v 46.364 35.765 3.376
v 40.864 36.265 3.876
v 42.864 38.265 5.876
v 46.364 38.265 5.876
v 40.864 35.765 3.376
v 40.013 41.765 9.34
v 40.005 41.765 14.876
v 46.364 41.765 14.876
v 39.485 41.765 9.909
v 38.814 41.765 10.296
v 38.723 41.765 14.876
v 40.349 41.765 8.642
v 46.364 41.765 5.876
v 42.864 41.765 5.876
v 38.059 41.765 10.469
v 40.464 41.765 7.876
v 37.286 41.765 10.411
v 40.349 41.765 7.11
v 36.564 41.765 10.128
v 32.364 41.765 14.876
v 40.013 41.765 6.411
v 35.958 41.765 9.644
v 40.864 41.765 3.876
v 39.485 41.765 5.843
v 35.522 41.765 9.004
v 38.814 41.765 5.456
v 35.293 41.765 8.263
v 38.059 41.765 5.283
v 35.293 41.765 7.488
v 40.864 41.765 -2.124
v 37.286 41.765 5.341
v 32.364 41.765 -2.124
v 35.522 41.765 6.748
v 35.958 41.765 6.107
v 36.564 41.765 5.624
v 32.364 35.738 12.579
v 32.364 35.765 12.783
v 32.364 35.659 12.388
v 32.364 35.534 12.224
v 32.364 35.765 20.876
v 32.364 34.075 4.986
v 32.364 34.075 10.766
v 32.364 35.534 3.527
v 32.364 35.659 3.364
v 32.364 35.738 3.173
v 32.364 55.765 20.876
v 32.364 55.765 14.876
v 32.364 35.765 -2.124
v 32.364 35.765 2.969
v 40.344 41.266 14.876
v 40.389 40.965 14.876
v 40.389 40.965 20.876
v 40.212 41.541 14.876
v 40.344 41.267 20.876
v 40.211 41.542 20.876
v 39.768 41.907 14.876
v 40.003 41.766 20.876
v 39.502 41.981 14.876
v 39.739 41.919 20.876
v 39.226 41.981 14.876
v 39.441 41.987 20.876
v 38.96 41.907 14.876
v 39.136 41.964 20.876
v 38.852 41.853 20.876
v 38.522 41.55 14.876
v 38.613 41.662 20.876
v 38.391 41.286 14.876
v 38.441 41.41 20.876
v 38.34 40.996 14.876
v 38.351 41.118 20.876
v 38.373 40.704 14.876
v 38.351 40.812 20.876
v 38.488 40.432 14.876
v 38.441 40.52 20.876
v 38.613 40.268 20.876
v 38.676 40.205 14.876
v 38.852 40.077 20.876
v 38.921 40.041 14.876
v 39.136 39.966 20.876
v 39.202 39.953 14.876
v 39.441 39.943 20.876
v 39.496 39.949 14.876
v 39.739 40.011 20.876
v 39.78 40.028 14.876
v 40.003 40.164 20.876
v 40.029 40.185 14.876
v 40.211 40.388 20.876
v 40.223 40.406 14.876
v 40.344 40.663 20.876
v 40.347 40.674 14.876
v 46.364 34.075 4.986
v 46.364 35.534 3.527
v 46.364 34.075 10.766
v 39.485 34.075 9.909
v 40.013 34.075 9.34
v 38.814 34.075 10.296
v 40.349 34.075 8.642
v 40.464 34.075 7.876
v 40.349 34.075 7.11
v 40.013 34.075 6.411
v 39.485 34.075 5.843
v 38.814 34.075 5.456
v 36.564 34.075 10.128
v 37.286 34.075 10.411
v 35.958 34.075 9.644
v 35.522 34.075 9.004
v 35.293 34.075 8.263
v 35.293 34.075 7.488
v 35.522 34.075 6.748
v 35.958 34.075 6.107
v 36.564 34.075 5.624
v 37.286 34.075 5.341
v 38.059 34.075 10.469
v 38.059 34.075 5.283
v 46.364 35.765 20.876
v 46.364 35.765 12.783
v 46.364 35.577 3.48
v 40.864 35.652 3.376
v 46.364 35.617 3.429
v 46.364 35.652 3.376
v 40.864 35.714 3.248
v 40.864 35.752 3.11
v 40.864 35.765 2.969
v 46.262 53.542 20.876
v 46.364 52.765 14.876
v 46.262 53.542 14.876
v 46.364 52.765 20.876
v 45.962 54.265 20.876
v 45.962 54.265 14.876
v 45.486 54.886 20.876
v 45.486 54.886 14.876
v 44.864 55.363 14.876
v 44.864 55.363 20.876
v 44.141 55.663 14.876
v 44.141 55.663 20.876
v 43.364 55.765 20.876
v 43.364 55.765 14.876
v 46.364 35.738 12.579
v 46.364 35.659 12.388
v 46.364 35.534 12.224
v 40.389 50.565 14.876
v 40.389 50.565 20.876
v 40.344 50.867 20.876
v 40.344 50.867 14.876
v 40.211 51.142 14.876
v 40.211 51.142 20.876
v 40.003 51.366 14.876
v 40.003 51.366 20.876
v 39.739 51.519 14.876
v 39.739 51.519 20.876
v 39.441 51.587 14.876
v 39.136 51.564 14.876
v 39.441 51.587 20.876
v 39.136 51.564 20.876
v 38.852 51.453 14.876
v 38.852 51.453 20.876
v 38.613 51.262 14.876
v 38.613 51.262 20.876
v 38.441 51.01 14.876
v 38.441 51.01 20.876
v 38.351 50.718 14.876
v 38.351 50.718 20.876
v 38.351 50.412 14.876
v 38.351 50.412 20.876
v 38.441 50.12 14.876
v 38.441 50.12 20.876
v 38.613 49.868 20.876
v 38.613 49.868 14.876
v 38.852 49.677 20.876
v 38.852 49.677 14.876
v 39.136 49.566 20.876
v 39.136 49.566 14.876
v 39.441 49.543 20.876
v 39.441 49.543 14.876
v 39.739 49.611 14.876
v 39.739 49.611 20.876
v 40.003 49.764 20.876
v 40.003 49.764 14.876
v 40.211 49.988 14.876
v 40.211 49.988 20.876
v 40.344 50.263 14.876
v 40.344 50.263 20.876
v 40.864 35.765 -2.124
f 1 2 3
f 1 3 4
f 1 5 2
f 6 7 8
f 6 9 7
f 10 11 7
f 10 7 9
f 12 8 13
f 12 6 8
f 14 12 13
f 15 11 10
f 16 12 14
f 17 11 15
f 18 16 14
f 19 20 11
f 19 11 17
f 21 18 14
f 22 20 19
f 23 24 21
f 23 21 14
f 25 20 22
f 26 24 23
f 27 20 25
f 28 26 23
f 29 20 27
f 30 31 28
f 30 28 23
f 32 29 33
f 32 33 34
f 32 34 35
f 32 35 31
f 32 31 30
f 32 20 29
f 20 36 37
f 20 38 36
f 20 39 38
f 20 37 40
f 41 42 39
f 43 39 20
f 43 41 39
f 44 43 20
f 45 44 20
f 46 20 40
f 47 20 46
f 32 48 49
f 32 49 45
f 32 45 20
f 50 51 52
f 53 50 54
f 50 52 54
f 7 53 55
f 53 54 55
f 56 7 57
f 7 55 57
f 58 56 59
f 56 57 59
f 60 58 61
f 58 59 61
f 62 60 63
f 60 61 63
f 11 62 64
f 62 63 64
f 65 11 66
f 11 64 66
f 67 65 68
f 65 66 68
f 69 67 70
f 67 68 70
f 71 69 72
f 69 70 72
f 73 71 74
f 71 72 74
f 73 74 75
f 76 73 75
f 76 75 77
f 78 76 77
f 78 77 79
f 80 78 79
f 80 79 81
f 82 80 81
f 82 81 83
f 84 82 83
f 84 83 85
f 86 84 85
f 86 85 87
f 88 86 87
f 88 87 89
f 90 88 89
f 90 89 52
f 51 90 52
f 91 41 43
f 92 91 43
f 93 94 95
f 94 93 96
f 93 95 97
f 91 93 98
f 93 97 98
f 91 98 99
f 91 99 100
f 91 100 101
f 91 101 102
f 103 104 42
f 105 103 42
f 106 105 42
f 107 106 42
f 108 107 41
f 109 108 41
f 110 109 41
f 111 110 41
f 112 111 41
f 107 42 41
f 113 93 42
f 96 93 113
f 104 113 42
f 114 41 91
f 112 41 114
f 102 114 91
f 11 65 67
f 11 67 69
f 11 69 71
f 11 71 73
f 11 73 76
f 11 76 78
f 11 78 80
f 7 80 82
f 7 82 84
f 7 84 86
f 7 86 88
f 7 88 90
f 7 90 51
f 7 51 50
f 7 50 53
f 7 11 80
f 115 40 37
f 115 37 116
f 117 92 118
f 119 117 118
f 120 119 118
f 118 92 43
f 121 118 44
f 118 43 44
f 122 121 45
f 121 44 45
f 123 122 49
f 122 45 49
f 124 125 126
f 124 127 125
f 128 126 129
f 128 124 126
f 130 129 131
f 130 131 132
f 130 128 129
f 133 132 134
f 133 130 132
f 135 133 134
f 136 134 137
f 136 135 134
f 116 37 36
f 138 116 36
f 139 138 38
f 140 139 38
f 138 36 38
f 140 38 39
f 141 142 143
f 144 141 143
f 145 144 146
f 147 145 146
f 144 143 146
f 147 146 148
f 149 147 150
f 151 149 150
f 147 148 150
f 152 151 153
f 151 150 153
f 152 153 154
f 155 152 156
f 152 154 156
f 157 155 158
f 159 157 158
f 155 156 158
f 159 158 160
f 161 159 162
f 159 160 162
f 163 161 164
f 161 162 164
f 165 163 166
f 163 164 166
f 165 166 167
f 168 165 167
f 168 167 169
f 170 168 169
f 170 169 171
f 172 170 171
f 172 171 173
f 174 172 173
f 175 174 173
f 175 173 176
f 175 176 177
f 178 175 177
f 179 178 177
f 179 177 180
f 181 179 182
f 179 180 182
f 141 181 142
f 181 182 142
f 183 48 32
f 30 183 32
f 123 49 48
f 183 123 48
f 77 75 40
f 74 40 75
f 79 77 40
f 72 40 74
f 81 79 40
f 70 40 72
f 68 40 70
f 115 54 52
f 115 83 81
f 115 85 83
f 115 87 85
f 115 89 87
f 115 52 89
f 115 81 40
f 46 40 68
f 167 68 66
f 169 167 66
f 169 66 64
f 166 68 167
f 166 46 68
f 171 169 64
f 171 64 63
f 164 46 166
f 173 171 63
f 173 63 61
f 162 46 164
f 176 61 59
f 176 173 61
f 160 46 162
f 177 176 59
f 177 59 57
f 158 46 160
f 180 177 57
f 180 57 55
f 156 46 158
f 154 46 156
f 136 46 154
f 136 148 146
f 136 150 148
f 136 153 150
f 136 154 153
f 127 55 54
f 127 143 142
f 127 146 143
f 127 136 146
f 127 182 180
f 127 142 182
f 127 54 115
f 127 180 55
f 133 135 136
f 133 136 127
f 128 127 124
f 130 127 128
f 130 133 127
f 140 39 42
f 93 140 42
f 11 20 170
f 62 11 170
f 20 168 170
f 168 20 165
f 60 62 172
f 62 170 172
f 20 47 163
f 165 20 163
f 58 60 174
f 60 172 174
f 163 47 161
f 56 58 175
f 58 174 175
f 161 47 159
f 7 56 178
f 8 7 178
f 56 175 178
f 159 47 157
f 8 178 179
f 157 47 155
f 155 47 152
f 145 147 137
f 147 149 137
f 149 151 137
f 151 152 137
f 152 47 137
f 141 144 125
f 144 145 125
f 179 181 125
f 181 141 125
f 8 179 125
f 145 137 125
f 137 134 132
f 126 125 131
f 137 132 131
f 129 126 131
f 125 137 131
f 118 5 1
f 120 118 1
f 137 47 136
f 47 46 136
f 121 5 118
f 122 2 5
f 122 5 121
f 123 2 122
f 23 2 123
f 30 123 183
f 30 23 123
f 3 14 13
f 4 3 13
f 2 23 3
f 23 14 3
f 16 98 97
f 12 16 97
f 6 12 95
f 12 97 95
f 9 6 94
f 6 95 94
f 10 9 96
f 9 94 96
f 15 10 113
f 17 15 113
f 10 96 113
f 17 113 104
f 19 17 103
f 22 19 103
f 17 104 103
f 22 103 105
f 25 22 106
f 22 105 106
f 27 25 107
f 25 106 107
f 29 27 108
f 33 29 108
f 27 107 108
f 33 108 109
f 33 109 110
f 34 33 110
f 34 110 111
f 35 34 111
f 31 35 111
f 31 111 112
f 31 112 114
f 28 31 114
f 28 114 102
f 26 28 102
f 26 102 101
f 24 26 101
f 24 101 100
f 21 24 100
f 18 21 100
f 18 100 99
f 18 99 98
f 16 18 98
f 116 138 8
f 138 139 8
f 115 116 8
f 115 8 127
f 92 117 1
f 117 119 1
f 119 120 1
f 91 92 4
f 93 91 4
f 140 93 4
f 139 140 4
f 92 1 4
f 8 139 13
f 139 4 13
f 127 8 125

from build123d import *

# Parameters (mm, degrees)
SKETCH1_W                = 20
SKETCH1_H                = 6
BOSS_EXTRUDE1_DEPTH      = 14
CUT_EXTRUDE1_REACH       = 9.69
SKETCH2_R                = 2.6
SKETCH3_W                = 14
SKETCH3_H                = 20
BOSS_EXTRUDE2_DEPTH      = 3
BOSS_EXTRUDE2_DEPTH_BACK = 3
SKETCH4_R                = 1.025
CUT_EXTRUDE4_DEPTH       = 6
SKETCH5_W                = 5.5
SKETCH5_H                = 8
CUT_EXTRUDE5_DEPTH       = 6
CHAMFER1_SIZE            = 2
CHAMFER2_SIZE            = 2.5
SKETCH6_W                = 5.5
SKETCH6_H                = 0.407228715
CUT_EXTRUDE6_DEPTH       = 2.69
FILLET1_R                = 3


with BuildPart() as part:
    # Sketch1 → Boss-Extrude1 (new body)
    with BuildSketch(Plane(origin=(32.364284334, 0, 0), x_dir=(0, 0, -1), z_dir=(1, 0, 0))):
        with Locations((-7.875866483, 38.765059464)):
            Rectangle(SKETCH1_W, SKETCH1_H)
        with BuildLine():
            Line((-12.22448084, 35.533673821), (-10.765866483, 34.075059464))
            Line((-10.765866483, 34.075059464), (-4.985866483, 34.075059464))
            Line((-4.985866483, 34.075059464), (-3.527252126, 35.533673821))
            ThreePointArc((-3.527252126, 35.533673821), (-3.27095768, 35.704924294), (-2.968637768, 35.765059464))
            Line((-2.968637768, 35.765059464), (-12.783095197, 35.765059464))
            ThreePointArc((-12.783095197, 35.765059464), (-12.480775285, 35.704924294), (-12.22448084, 35.533673821))
        make_face()
    extrude(amount=BOSS_EXTRUDE1_DEPTH)

    # Sketch2 → Cut-Extrude1 (cut, up to next)
    with BuildSketch(Plane.XZ.offset(-34.075059464), mode=Mode.PRIVATE) as cut_extrude1_sk1:
        with Locations((37.864284334, 7.875866483)):
            Circle(SKETCH2_R)
    cut_extrude1_tool1 = extrude(cut_extrude1_sk1.sketch, amount=-CUT_EXTRUDE1_REACH, mode=Mode.PRIVATE) & part.part
    add(cut_extrude1_tool1.solids().sort_by_distance((37.864284, 34.075059, 7.875866))[0], mode=Mode.SUBTRACT)

    # Sketch3 → Boss-Extrude2 (add, two sides)
    with BuildSketch(Plane.XY.offset(17.875866483)) as boss_extrude2_sk:
        with Locations((39.364284334, 45.765059464)):
            Rectangle(SKETCH3_W, SKETCH3_H)
    extrude(amount=BOSS_EXTRUDE2_DEPTH)
    extrude(boss_extrude2_sk.sketch, amount=-BOSS_EXTRUDE2_DEPTH_BACK)

    # Sketch4 → Cut-Extrude4 (cut)
    with BuildSketch(Plane.XY.offset(20.875866483)):
        with Locations((39.364284334, 50.565059464)):
            Circle(SKETCH4_R)
        with Locations((39.364284334, 40.965059464)):
            Circle(SKETCH4_R)
    extrude(amount=-CUT_EXTRUDE4_DEPTH, mode=Mode.SUBTRACT)

    # Sketch5 → Cut-Extrude5 (cut)
    with BuildSketch(Plane(origin=(0, 41.765059464, 0), x_dir=(1, 0, 0), z_dir=(0, 1, 0))):
        with Locations((43.614284334, -1.875866483)):
            Rectangle(SKETCH5_W, SKETCH5_H)
    extrude(amount=-CUT_EXTRUDE5_DEPTH, mode=Mode.SUBTRACT)

    # Chamfer1
    chamfer1_edges = [part.edges().sort_by_distance(p)[0] for p in [
        (40.864284334, 38.765059464, 5.875866483),
    ]]
    chamfer(chamfer1_edges, length=CHAMFER1_SIZE)

    # Chamfer2
    chamfer2_edges = [part.edges().sort_by_distance(p)[0] for p in [
        (44.614284334, 35.765059464, 5.875866483),
    ]]
    chamfer(chamfer2_edges, length=CHAMFER2_SIZE)

    # Sketch6 → Cut-Extrude6 (cut, through all)
    with BuildSketch(Plane(origin=(0, 35.765059464, 0), x_dir=(1, 0, 0), z_dir=(0, 1, 0))):
        with Locations((43.614284334, -3.172252126)):
            Rectangle(SKETCH6_W, SKETCH6_H)
    extrude(amount=-CUT_EXTRUDE6_DEPTH, mode=Mode.SUBTRACT)

    # Fillet1
    fillet1_edges = [part.edges().sort_by_distance(p)[0] for p in [
        (46.364284334, 55.765059464, 17.875866483),
    ]]
    fillet(fillet1_edges, radius=FILLET1_R)


solid = part.part
